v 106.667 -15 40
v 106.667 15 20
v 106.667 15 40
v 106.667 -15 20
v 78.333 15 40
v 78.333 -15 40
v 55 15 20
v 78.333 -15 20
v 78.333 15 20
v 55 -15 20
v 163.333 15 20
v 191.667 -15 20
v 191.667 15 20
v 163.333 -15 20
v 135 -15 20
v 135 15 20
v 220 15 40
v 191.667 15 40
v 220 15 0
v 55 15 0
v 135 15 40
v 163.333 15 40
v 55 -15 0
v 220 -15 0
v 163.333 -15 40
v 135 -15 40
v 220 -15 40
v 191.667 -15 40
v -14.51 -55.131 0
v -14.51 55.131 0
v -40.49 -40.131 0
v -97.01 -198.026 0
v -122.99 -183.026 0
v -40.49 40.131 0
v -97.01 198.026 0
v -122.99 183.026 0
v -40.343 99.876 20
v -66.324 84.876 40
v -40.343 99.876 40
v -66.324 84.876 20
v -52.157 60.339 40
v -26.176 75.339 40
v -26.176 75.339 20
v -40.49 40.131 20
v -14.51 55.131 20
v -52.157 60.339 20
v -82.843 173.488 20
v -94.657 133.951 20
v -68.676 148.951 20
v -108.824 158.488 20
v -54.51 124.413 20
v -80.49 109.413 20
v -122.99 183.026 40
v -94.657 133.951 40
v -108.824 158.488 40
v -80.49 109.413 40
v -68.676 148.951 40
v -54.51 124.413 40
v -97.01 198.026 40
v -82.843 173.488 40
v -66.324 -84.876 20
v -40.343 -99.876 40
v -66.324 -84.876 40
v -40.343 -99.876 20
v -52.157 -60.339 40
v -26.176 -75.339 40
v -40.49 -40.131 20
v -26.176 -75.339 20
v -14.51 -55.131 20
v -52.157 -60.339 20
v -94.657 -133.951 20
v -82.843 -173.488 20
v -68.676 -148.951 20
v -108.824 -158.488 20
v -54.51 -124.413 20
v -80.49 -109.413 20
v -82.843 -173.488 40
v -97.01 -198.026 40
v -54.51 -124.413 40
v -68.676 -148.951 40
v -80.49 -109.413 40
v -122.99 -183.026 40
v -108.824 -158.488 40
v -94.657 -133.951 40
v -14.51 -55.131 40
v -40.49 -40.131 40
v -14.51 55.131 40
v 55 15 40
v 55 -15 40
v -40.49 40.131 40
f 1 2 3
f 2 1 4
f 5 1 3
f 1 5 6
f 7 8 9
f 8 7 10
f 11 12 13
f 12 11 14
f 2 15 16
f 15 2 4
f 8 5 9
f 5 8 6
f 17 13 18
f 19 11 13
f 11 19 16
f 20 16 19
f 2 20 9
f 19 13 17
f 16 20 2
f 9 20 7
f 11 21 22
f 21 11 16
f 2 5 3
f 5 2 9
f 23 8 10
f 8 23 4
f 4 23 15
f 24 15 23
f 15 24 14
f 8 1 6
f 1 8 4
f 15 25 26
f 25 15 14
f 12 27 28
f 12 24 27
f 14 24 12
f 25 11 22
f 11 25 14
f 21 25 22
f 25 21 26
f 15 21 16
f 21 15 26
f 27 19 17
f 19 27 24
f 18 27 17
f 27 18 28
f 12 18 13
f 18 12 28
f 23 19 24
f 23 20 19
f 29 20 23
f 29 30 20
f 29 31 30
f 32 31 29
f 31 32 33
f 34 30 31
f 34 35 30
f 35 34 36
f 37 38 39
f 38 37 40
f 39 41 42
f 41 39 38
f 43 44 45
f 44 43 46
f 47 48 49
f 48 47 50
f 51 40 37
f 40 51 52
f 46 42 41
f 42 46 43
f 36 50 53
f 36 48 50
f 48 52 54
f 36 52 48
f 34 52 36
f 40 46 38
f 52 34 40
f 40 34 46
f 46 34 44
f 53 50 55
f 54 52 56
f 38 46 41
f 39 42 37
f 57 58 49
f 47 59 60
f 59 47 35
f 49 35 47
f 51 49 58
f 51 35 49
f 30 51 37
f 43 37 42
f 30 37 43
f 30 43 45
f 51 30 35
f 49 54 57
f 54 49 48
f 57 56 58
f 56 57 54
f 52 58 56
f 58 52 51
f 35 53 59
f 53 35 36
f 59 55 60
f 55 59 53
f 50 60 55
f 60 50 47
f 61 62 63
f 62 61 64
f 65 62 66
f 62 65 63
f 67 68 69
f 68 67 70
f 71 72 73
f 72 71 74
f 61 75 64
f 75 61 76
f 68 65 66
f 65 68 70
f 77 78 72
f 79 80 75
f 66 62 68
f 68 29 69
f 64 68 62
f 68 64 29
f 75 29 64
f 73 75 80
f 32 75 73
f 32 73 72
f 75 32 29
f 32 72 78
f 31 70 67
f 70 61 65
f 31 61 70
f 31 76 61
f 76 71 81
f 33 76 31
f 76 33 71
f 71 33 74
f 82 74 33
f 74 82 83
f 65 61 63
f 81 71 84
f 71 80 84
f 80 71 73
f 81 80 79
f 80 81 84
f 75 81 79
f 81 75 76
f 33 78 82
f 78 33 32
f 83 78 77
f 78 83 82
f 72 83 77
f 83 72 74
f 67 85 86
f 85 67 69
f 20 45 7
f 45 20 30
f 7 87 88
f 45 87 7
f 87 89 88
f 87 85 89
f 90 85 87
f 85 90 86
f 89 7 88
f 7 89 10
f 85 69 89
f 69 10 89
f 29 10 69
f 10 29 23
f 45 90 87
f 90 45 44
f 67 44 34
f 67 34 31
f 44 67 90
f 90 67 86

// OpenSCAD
!starfish(body_radius=50, height=40, finger_length=170, finger_width=30, num_fingers=3, num_teeth_per_finger=3, show_holes=false);
finger(length=170, width=30, height=40, num_teeth=3);
body(radius=50, width=30, height=40, num_ports=3);

module starfish(body_radius, height, finger_length, finger_width, num_fingers, num_teeth_per_finger, echo_holes=true, show_holes=false, eps=0.5)
{
    translate([0, 0, height/2])
        body(radius=body_radius, width=finger_width, height=height, num_ports=num_fingers);
    angle = 360/num_fingers;
    for (i=[0:num_fingers-1])
    {
        rotate(a=i*angle, v=[0,0,1])
            translate([body_radius, -finger_width/2, 0])
                finger(length=finger_length, width=finger_width, height=height, num_teeth=num_teeth_per_finger);
        holes(body_radius, height, finger_length, finger_width, num_fingers, num_teeth_per_finger, i*angle, echo_holes, show_holes, eps);
    }
}


module holes(body_radius, height, finger_length, finger_width, num_fingers, num_teeth_per_finger, angle, echo_holes, show_holes, eps)
{
    if (echo_holes || show_holes)
    {
        teeth_length = finger_length / (2*num_teeth_per_finger);
        for (j=[1:2:2*num_teeth_per_finger])
        {
            center = [(j+0.5)*teeth_length+body_radius, 0, 0.75*height];
            shift = [0.5*teeth_length-eps,0,0];
            hole_1 = rotate_point(point=center-shift, angle=angle);
            hole_2 = rotate_point(point=center+shift, angle=angle);
            if (echo_holes) {echo(hole_1); echo(hole_2);}
            if (show_holes) {translate(hole_1)sphere(d=5); translate(hole_2)sphere(d=5);}
        }           
    }
}


module body(radius, width, height, num_ports)
{
    angle = 360/num_ports;
    hull()
    {
        for (i=[0:num_ports-1])
        {
            rotate(a=i*angle, v=[0,0,1])
                translate([radius, 0, 0]) cube([10, width, height], center=true);
        }
     }
    
}


module finger(length, width, height, num_teeth)
{
    teeth_length = length / (num_teeth*2);
    cube([length, width, height/2]);
    for (i=[1:2:2*num_teeth])
    {
        translate([i*teeth_length, 0, height/2])
            cube([teeth_length, width, height/2]);
    }
   
}


function rotate_point(point, angle) =
    [
        [cos(angle), -sin(angle), 0],
        [sin(angle),  cos(angle), 0],
        [         0,           0, 1]
   ] * point;
